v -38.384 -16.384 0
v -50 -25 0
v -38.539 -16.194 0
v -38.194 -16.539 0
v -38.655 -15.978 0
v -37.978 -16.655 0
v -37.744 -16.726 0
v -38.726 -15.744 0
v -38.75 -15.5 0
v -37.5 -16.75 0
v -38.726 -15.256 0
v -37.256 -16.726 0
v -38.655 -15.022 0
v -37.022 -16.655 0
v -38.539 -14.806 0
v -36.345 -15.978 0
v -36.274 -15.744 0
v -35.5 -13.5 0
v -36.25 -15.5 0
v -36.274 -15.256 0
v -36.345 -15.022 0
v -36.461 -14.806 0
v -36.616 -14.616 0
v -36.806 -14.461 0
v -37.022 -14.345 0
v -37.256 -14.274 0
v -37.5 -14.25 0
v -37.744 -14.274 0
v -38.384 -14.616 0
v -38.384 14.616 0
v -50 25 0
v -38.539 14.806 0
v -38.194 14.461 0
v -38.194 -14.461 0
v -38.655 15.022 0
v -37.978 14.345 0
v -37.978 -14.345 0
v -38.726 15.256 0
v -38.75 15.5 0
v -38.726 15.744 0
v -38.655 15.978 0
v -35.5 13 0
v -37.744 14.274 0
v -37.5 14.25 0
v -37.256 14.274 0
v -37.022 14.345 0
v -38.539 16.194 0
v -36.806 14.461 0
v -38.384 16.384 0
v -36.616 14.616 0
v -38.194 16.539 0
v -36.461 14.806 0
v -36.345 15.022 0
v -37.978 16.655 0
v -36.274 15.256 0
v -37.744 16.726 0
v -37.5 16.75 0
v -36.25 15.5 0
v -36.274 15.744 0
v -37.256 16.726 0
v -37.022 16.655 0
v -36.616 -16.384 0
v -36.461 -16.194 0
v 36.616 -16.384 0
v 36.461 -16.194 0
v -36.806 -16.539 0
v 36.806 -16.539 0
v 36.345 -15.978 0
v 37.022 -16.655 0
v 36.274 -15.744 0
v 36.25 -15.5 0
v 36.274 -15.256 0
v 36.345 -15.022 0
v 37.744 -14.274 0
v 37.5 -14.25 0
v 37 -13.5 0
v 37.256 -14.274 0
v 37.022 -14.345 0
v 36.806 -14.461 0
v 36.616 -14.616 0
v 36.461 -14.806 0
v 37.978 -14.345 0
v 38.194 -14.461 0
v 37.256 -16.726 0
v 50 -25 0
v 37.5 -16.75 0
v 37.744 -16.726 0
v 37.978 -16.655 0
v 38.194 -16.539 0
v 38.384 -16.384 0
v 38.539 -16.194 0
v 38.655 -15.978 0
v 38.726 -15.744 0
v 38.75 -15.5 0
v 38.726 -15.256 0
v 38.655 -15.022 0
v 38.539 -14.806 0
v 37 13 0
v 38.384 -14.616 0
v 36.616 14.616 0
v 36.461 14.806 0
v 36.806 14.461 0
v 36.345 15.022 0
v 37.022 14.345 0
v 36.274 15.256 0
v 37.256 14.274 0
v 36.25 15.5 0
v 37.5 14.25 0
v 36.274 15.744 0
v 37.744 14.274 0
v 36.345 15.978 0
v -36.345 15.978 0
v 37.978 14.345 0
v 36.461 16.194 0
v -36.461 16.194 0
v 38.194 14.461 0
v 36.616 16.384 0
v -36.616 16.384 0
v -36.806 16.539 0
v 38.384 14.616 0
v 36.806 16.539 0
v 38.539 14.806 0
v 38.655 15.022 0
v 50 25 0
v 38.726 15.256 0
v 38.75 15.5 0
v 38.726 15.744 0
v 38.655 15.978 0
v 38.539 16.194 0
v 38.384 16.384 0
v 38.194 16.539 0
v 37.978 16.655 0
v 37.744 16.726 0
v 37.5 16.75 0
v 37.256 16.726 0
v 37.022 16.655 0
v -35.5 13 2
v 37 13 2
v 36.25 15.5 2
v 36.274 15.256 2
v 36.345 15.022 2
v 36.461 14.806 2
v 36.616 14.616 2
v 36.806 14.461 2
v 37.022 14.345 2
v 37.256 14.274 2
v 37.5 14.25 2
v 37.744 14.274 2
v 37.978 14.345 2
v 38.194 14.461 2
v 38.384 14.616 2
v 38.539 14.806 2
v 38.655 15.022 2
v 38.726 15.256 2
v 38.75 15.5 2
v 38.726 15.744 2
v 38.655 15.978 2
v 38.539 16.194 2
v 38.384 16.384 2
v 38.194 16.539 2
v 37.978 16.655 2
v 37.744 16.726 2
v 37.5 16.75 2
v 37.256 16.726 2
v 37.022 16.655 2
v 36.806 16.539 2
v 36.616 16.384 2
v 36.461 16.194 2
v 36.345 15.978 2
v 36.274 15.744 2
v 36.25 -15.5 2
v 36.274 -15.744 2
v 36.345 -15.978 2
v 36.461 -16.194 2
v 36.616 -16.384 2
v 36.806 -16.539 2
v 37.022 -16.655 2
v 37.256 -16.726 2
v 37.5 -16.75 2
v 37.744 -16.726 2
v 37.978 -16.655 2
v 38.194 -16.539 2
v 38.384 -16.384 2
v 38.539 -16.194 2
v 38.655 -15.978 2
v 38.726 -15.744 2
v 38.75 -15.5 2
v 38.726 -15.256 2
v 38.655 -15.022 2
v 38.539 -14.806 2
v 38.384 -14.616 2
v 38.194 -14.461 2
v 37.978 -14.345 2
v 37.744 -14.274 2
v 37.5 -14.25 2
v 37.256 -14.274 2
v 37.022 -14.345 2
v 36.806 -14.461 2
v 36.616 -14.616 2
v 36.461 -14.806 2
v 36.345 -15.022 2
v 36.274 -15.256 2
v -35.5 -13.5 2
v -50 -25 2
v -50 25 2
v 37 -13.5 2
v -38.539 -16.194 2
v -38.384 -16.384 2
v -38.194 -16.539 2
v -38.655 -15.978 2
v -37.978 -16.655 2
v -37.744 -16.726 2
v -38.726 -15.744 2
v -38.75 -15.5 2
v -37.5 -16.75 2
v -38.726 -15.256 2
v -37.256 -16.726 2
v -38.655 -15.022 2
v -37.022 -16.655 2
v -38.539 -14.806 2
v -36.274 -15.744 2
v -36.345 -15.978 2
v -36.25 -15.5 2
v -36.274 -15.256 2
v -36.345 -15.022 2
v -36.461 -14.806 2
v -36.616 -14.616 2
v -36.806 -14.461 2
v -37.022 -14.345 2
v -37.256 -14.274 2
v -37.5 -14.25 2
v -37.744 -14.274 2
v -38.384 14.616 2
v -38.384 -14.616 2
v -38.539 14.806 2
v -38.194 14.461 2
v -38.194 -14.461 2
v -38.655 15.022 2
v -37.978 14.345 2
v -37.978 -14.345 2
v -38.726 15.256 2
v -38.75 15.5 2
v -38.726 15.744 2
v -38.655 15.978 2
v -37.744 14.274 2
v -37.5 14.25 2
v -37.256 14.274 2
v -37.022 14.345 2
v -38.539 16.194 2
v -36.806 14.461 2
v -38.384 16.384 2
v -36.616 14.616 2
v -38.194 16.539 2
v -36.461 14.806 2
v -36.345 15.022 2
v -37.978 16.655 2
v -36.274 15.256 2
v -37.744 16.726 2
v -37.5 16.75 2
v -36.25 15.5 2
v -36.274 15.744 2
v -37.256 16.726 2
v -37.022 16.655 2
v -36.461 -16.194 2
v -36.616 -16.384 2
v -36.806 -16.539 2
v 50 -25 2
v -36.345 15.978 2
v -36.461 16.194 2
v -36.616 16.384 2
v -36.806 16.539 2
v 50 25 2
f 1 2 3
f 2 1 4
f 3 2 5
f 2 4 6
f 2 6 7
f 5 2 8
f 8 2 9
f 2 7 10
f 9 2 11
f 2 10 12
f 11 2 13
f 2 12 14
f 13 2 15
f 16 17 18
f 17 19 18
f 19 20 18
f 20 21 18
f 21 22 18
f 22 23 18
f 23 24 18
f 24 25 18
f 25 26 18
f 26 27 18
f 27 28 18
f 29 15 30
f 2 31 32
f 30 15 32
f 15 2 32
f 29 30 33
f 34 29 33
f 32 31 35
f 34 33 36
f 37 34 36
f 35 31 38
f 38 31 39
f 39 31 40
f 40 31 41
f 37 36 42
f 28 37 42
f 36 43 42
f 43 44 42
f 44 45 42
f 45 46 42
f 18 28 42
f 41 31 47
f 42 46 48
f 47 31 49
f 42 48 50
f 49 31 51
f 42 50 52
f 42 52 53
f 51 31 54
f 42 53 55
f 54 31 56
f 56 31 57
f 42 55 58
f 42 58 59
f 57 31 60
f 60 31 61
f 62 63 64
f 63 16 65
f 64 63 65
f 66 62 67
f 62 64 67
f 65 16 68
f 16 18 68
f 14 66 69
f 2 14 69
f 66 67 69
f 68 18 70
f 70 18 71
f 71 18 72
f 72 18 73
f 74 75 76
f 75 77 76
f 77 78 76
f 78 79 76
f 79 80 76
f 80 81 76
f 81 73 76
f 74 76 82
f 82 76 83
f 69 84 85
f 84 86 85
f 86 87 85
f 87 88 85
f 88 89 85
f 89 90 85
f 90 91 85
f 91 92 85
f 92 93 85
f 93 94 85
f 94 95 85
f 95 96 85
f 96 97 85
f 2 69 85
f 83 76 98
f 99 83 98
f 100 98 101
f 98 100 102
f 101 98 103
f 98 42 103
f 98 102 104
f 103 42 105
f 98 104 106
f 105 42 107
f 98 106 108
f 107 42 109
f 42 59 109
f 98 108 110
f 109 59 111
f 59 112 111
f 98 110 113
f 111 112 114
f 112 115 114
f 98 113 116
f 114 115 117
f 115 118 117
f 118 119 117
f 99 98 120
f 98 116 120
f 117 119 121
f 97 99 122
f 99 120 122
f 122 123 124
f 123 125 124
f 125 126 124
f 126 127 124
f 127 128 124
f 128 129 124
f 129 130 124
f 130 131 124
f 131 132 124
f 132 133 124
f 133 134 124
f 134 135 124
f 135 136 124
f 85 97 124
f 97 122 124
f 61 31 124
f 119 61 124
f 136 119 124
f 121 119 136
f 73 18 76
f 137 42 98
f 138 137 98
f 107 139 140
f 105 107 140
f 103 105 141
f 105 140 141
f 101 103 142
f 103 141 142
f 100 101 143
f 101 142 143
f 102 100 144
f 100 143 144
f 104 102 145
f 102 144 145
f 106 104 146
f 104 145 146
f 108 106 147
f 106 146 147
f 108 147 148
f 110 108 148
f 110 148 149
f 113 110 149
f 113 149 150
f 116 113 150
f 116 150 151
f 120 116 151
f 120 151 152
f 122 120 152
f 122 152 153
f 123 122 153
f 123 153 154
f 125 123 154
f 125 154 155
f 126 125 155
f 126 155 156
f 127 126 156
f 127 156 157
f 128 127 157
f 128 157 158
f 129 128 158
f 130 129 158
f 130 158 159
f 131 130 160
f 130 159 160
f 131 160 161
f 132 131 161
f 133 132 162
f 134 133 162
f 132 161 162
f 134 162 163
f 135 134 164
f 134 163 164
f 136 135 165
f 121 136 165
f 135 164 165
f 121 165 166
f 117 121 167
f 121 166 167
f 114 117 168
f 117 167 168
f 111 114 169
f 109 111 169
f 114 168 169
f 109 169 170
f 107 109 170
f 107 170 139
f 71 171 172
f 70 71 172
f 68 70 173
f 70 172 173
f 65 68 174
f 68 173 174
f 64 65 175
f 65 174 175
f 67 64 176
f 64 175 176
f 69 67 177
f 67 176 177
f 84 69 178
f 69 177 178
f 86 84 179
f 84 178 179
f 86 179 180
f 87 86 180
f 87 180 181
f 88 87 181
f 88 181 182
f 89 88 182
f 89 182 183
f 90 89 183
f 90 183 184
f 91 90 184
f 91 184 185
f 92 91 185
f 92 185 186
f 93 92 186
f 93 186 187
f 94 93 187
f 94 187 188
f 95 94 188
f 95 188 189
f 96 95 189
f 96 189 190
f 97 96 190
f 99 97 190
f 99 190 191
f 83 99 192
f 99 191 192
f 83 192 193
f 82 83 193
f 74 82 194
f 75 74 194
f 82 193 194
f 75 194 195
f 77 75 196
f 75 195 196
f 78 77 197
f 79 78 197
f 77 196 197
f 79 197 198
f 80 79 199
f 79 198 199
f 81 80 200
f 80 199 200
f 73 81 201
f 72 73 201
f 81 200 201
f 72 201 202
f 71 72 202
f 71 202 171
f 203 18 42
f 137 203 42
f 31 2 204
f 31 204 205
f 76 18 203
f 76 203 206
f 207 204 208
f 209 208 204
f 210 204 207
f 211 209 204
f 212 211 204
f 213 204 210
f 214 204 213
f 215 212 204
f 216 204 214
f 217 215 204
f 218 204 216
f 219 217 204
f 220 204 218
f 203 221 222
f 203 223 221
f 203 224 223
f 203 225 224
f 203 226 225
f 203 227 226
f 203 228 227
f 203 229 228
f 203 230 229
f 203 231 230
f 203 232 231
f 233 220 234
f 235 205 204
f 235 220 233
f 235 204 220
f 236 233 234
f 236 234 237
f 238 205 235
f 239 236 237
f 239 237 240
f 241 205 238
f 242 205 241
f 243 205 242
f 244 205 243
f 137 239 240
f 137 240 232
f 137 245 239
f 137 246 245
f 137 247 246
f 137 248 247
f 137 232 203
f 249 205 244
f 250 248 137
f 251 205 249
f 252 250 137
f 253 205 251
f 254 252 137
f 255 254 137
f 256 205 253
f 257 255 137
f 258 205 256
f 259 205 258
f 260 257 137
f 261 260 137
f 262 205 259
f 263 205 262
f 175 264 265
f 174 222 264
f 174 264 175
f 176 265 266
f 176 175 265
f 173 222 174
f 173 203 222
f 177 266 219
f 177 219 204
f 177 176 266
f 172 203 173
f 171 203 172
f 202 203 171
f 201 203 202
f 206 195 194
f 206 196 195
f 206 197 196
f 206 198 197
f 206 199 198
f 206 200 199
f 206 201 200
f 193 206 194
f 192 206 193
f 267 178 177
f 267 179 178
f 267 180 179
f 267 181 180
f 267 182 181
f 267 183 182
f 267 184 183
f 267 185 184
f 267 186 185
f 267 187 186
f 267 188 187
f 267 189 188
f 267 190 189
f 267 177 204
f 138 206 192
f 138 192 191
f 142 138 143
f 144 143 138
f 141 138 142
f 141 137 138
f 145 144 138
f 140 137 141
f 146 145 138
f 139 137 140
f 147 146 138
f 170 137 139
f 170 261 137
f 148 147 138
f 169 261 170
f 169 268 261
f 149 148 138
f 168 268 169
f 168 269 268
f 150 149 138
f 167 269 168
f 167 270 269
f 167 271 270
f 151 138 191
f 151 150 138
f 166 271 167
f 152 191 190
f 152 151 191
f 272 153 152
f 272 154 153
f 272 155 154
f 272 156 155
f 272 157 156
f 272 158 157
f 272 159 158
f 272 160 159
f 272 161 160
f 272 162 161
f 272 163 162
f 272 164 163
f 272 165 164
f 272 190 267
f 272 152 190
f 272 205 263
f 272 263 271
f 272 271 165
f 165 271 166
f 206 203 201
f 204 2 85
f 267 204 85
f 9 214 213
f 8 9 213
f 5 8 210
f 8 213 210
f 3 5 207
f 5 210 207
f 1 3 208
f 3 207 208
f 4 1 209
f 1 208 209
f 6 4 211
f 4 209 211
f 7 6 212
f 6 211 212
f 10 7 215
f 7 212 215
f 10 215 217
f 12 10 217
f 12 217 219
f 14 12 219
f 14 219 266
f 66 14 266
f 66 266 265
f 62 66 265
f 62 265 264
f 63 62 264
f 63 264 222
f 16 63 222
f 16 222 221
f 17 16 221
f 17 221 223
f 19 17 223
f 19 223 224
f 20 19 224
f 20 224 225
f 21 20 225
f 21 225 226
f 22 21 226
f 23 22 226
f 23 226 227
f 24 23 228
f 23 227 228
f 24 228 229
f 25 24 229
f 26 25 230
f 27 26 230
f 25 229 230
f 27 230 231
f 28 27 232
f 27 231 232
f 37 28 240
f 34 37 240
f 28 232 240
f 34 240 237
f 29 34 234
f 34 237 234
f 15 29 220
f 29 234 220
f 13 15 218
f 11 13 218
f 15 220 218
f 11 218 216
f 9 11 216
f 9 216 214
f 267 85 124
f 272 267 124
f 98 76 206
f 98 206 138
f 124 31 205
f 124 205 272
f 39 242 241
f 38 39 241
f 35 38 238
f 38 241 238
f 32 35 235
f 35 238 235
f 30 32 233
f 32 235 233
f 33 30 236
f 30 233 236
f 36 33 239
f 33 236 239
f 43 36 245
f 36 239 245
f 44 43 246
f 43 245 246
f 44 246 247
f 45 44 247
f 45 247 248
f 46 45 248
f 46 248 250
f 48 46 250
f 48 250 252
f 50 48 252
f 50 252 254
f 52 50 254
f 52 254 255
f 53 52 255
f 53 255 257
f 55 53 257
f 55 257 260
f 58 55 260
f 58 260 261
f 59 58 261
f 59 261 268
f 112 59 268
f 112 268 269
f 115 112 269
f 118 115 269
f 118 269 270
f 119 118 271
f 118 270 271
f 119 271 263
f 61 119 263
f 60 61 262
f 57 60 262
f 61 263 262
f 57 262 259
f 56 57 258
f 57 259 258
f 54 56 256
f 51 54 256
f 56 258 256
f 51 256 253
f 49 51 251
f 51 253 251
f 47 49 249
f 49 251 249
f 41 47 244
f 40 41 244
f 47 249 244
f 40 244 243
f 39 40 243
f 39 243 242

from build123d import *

# Parameters (mm, degrees)
F0_W     = 100
F0_H     = 50
F0_W_2   = 72.5
F0_H_2   = 26.5
F1_DEPTH = 2
F2_D     = 2.5


with BuildPart() as f1:
    # F0 (on Top) → F1 (new body)
    with BuildSketch(Plane.XY):
        Rectangle(F0_W, F0_H)
        with Locations((0.75, -0.25)):
            Rectangle(F0_W_2, F0_H_2, mode=Mode.SUBTRACT)
    extrude(amount=F1_DEPTH)

    # F2 (through all)
    with Locations(Plane(origin=(0, 0, 0), x_dir=(1, 0, 0), z_dir=(0, 0, -1))):
        with Locations((-37.5, -15.5), (-37.5, 15.5), (37.5, 15.5), (37.5, -15.5)):
            Hole(F2_D / 2)


solid = f1.part
